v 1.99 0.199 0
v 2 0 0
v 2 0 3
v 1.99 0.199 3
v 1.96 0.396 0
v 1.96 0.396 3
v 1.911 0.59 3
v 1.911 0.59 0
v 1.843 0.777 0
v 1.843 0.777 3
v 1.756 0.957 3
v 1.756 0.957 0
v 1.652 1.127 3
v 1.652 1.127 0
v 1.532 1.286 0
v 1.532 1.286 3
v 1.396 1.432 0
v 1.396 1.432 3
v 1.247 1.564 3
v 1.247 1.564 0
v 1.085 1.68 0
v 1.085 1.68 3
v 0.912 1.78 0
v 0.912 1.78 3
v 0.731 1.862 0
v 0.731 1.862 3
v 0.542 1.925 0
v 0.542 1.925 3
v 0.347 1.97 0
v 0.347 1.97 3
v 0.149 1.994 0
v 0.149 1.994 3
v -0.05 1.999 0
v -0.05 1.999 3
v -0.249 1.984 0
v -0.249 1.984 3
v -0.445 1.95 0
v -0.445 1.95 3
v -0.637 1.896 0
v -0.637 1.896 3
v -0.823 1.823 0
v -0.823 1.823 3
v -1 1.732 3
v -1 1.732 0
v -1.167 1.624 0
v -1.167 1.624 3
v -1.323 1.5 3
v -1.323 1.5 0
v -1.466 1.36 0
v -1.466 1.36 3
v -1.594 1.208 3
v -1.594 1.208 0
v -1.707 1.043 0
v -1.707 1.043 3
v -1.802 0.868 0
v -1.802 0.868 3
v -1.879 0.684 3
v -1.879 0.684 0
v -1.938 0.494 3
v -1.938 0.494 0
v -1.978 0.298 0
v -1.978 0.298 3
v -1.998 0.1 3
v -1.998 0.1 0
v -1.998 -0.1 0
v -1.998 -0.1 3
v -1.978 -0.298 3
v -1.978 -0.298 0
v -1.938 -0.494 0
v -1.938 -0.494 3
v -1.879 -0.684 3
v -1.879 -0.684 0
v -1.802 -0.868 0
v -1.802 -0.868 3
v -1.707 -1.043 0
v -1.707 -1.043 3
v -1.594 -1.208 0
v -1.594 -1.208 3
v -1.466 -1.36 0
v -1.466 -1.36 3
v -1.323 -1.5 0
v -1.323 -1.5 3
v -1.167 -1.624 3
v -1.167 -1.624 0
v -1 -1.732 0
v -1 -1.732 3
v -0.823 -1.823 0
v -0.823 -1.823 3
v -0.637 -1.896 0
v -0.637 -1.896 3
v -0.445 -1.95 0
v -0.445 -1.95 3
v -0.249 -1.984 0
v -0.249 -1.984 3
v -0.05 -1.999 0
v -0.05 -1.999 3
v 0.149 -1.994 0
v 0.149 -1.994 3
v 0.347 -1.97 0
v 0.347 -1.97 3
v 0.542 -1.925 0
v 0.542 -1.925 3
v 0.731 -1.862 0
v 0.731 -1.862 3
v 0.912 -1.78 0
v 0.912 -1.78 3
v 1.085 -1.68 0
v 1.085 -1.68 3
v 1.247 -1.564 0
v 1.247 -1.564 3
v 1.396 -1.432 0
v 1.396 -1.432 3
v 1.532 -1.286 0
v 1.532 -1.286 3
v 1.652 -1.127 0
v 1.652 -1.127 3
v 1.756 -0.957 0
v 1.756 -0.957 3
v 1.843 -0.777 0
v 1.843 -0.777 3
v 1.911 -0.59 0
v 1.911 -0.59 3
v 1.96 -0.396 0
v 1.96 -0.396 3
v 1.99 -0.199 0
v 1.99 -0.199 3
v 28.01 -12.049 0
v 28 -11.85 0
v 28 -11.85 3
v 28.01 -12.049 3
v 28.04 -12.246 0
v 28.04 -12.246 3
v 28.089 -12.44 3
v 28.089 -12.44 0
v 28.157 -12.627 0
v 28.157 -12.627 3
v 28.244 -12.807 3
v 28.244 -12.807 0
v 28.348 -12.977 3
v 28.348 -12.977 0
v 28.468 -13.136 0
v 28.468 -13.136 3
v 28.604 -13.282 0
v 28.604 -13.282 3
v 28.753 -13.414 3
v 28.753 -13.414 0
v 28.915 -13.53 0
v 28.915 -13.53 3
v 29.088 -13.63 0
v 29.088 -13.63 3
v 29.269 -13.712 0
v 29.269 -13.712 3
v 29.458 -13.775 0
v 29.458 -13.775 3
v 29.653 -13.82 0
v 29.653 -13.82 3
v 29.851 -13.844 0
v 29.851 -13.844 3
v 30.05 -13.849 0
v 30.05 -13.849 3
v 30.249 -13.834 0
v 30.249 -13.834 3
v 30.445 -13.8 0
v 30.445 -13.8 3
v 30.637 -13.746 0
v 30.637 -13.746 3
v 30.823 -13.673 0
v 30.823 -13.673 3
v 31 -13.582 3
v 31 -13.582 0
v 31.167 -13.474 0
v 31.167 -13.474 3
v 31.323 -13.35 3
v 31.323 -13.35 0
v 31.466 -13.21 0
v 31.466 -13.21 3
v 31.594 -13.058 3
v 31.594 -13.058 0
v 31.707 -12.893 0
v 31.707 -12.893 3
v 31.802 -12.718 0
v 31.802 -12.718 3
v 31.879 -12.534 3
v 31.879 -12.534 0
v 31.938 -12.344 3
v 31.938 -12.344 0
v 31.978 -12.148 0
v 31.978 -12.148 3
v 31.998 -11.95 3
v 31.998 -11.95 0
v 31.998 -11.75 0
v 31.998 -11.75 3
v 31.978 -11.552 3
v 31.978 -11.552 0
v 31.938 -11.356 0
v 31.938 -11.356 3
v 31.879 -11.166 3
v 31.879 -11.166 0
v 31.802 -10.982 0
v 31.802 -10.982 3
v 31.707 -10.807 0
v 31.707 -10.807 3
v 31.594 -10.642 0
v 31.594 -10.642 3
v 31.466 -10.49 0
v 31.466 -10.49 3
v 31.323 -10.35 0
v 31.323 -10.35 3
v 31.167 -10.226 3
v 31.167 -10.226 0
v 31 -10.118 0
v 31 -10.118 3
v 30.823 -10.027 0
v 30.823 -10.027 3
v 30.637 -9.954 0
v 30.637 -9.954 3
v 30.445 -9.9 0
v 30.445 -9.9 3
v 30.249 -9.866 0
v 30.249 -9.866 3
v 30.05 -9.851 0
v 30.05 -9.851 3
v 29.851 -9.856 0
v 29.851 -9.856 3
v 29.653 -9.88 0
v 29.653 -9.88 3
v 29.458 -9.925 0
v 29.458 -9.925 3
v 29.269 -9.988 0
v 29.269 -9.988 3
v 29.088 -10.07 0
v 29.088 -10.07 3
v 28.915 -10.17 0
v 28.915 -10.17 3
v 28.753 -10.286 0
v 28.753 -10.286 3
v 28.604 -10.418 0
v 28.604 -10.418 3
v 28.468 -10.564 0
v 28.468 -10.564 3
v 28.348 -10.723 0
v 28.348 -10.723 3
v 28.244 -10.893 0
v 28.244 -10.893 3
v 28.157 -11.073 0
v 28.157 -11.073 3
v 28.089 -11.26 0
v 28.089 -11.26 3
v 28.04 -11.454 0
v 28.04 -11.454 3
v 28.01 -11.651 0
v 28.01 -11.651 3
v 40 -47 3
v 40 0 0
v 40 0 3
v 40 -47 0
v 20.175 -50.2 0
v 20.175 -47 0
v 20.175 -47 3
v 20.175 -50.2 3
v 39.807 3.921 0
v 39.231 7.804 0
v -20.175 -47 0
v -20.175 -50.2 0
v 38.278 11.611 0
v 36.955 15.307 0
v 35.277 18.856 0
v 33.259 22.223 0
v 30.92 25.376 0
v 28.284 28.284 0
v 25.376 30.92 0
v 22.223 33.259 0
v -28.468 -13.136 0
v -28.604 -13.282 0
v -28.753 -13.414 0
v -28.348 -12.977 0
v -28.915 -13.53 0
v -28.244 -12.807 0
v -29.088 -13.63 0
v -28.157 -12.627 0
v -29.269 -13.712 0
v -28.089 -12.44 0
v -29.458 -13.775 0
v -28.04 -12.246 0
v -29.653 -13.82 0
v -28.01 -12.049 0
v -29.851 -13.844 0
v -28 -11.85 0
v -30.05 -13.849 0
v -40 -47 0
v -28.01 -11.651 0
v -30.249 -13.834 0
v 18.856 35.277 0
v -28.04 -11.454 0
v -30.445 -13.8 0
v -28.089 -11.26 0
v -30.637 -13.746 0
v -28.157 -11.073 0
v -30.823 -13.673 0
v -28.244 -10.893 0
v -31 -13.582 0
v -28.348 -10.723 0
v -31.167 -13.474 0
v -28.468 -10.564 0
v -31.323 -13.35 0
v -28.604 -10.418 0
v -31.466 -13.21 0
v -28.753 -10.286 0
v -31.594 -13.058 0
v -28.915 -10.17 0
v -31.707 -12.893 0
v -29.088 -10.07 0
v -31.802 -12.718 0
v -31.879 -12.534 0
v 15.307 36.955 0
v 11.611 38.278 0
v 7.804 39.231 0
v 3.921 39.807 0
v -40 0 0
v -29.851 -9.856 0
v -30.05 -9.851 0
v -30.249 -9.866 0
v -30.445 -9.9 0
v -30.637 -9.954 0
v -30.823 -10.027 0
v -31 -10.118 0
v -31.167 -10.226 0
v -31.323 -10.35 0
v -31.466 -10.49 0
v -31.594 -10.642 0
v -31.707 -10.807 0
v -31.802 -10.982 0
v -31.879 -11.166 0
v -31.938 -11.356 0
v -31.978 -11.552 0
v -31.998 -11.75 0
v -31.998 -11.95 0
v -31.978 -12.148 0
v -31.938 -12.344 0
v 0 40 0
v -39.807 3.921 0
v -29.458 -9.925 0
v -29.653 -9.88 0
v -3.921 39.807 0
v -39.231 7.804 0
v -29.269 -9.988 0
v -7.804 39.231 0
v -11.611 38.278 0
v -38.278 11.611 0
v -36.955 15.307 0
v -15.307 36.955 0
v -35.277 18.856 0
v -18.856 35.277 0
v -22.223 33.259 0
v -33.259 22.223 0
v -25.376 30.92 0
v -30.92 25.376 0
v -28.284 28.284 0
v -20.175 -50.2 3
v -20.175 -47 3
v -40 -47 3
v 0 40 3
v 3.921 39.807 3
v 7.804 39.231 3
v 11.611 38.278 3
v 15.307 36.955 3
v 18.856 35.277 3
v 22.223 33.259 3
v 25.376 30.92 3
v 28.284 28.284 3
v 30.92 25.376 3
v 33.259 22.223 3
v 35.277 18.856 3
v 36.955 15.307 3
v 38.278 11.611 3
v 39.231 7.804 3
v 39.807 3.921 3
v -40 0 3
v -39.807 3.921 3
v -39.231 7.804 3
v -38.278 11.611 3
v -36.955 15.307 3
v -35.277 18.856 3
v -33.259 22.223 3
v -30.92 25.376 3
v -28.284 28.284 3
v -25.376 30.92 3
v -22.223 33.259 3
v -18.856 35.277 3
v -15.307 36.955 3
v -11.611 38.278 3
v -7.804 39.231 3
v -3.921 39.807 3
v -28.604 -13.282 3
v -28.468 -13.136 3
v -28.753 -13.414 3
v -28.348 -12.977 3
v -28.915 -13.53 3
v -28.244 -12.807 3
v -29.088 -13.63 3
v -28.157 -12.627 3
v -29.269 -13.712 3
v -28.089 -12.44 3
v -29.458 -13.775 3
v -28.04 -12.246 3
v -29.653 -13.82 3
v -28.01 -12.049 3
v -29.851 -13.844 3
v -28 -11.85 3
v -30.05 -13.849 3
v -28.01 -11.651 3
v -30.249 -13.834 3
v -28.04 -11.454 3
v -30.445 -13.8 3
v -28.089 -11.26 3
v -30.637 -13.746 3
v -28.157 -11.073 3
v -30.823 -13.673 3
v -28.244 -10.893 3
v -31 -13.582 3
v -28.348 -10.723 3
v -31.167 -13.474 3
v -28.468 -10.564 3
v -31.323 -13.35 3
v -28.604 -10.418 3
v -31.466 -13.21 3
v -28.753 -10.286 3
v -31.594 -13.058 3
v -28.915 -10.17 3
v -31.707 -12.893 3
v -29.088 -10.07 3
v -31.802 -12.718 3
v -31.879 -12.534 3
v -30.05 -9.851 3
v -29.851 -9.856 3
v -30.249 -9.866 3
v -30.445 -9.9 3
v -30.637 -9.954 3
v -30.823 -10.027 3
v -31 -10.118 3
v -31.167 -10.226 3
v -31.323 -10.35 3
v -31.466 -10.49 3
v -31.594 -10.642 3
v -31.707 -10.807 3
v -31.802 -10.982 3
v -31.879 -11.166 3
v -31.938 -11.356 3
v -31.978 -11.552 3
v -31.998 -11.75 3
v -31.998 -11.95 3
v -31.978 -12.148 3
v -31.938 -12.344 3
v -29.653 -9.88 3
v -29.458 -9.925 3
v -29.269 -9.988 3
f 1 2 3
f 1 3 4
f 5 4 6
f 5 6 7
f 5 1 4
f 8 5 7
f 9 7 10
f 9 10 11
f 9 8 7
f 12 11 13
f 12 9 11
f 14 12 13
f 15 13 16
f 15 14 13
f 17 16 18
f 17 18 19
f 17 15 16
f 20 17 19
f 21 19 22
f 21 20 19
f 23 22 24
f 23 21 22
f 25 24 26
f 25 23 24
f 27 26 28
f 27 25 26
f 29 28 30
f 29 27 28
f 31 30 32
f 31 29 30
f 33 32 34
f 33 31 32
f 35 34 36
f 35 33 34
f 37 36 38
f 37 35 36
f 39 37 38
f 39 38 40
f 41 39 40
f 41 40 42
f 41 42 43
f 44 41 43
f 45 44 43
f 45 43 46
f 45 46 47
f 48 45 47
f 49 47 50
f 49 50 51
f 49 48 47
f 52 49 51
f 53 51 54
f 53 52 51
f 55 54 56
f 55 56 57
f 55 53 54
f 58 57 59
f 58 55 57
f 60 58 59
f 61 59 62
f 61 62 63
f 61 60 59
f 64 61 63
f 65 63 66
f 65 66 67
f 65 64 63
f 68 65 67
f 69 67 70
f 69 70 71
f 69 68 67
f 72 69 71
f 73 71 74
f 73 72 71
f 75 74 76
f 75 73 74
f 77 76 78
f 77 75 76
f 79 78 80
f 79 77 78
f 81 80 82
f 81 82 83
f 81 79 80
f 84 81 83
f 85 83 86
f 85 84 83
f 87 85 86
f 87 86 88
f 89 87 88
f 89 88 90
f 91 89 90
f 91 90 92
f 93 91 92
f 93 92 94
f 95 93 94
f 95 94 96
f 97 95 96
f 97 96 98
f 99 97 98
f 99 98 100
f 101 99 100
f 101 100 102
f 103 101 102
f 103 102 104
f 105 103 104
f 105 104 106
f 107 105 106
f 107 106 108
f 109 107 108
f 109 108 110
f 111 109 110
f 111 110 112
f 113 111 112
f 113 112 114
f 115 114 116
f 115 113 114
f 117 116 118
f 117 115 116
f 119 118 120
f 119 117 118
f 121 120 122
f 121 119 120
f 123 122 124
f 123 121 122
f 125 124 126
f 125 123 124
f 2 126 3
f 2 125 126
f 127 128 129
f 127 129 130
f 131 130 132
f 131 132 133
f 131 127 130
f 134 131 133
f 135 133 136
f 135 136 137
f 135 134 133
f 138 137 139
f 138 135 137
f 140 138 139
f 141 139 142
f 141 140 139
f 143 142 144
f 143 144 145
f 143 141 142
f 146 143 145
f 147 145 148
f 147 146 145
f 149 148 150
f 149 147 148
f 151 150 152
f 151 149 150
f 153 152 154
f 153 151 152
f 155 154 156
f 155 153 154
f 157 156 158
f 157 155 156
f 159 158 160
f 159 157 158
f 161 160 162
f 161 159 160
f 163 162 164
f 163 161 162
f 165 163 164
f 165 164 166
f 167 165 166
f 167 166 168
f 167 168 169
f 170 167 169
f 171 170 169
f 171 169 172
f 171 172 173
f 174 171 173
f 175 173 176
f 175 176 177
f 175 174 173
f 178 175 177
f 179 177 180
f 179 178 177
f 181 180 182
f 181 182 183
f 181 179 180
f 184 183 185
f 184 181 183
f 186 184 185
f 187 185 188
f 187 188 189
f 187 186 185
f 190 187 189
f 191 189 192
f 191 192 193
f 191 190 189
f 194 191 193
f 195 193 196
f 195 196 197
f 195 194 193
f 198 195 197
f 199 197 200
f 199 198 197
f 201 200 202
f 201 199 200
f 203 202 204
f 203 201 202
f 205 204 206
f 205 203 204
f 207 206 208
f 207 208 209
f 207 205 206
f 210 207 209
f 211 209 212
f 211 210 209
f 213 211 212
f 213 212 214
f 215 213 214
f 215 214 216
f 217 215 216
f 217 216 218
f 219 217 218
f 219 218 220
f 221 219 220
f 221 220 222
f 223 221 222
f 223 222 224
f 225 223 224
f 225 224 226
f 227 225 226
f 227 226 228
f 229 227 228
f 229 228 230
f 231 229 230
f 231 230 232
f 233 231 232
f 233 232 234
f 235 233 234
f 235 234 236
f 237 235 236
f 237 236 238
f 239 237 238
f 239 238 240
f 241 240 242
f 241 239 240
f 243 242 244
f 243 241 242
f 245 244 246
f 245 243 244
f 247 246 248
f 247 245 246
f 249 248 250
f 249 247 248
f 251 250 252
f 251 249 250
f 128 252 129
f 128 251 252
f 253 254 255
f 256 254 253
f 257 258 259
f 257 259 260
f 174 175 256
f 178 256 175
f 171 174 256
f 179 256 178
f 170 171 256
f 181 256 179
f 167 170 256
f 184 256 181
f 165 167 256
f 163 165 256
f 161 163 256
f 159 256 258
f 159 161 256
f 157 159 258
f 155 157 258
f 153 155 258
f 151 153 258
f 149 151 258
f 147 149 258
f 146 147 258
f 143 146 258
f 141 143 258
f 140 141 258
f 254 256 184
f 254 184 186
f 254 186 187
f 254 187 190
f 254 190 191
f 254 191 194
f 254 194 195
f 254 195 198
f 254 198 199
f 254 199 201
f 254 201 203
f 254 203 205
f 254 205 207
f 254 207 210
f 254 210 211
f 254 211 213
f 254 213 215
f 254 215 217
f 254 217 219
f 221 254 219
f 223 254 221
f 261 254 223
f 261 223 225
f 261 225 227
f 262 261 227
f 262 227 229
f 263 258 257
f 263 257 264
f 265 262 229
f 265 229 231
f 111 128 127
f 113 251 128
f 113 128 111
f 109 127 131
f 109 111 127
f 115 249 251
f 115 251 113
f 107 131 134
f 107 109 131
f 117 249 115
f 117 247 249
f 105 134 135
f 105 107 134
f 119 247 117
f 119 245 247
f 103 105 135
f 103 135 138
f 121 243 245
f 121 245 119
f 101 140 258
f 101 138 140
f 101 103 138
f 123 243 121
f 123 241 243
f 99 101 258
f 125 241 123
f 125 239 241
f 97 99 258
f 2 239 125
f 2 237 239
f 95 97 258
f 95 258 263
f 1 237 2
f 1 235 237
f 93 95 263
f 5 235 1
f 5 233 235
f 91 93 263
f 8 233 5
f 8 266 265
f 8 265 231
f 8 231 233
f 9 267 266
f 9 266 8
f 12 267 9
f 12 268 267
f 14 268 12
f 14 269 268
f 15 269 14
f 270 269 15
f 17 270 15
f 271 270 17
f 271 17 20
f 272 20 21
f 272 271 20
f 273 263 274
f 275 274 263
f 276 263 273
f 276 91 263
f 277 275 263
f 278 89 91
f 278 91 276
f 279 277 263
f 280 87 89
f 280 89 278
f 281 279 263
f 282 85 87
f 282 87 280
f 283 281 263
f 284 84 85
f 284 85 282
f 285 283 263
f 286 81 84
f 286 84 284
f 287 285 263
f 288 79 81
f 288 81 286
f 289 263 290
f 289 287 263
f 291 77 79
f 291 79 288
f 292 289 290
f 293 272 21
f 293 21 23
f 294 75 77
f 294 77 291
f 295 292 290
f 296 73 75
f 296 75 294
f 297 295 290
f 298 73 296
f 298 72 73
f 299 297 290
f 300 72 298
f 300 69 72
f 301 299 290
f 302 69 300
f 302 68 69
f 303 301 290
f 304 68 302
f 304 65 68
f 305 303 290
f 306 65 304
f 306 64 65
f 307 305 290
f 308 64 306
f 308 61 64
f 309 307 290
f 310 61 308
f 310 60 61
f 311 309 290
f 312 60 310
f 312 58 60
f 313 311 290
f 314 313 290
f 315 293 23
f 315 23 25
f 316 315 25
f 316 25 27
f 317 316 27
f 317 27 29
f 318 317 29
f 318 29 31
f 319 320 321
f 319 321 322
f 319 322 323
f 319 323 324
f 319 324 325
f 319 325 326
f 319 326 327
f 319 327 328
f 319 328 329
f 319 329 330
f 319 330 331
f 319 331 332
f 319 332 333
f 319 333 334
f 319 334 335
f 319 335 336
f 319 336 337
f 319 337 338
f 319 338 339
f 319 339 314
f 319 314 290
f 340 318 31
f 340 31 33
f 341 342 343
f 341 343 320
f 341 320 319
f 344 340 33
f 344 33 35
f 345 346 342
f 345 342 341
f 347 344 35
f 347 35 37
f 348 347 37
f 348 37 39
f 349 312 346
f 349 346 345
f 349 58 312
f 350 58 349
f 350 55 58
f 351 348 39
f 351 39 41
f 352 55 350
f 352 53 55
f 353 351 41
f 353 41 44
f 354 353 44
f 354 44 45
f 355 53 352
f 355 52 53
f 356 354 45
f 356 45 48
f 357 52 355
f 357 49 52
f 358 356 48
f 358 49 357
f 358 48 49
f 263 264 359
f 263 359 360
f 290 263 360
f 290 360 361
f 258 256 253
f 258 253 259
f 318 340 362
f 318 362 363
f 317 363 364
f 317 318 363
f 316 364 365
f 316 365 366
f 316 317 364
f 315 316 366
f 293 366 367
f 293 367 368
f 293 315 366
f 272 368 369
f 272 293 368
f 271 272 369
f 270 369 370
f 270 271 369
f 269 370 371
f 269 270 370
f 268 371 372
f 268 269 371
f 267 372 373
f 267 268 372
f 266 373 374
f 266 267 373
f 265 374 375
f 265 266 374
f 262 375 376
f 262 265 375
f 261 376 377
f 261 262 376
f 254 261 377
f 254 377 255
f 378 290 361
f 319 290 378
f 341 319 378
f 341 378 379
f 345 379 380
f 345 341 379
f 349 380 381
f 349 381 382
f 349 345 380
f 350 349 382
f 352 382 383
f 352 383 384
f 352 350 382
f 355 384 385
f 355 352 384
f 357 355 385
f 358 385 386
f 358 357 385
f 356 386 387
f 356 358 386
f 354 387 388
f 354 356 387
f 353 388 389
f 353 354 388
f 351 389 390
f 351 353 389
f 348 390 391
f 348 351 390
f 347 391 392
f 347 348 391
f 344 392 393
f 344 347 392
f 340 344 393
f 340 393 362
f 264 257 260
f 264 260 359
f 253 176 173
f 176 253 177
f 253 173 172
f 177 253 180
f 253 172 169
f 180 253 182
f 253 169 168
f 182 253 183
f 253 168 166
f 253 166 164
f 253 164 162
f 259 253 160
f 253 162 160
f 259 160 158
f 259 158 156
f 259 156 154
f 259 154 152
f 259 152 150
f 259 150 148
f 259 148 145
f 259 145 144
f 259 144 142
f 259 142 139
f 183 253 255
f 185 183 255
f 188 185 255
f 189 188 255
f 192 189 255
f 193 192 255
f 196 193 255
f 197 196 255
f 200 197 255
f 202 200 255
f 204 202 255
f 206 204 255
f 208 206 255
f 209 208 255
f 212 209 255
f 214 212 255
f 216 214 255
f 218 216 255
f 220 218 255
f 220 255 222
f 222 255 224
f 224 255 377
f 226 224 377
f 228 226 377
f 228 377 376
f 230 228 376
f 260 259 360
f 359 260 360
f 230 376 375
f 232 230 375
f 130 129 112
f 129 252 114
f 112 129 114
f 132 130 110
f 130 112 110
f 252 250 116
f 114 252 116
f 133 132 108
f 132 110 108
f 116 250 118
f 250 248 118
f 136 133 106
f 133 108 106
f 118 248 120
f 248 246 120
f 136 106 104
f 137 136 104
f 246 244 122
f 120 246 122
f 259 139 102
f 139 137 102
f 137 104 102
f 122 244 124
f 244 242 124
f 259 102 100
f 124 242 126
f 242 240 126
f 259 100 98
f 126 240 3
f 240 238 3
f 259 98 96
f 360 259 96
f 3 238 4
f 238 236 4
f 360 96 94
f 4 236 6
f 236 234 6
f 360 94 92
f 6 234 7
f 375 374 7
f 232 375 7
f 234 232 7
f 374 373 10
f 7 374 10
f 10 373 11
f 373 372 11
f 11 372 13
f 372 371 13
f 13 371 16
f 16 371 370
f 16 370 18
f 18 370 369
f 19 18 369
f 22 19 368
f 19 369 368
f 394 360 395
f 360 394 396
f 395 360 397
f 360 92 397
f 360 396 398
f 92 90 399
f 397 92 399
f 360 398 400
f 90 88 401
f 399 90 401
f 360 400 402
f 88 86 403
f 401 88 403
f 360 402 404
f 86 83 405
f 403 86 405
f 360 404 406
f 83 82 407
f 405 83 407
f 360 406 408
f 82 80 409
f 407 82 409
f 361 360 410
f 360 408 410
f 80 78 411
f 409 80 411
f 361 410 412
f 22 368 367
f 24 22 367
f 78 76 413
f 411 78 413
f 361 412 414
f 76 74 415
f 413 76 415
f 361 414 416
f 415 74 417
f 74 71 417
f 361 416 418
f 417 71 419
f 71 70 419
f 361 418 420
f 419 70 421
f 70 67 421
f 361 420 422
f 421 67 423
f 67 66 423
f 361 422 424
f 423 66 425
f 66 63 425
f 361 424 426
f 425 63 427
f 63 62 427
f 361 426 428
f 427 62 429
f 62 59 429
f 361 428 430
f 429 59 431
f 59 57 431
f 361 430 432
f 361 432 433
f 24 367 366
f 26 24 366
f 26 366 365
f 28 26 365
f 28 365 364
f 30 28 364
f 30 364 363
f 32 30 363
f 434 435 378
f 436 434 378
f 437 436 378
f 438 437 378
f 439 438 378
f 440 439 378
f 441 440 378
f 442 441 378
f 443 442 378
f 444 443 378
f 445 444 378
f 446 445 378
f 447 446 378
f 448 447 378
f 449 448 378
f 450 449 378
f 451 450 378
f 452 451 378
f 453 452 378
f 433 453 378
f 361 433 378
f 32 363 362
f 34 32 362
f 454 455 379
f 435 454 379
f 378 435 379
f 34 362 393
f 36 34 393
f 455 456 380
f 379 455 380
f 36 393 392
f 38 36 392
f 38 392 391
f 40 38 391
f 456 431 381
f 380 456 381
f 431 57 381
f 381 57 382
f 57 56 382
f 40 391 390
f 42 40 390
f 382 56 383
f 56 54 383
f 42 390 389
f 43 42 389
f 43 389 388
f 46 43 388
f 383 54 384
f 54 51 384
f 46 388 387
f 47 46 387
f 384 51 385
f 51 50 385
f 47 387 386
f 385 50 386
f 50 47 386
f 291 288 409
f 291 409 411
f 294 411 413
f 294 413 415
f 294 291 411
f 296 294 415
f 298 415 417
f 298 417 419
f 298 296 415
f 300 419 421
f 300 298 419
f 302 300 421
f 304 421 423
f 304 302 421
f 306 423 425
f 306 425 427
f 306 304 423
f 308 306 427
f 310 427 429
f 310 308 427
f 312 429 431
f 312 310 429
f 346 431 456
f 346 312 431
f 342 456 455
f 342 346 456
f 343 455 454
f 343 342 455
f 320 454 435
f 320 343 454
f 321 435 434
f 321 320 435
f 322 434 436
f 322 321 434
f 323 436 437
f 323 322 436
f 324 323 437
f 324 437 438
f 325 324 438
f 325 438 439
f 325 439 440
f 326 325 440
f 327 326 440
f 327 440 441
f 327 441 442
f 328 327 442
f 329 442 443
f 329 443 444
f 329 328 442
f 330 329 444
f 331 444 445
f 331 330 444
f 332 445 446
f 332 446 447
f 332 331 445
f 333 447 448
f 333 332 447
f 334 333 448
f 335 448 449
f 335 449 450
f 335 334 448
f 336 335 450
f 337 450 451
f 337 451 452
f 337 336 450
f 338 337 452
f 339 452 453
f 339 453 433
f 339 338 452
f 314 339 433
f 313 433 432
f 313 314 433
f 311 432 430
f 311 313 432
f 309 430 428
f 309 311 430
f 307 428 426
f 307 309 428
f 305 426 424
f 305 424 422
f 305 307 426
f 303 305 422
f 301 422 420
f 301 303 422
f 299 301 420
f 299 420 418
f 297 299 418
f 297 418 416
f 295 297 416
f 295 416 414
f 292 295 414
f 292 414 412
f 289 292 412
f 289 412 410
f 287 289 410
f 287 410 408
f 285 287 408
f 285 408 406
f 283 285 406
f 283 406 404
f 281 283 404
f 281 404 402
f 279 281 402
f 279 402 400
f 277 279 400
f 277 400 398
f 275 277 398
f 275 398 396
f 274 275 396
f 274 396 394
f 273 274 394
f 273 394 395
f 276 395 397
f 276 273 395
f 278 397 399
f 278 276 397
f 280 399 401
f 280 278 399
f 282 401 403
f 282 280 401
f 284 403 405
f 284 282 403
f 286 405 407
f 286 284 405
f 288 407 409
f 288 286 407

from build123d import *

# Parameters (mm, degrees)
CROQUIS1_R              = 2
SALIENTE_EXTRUIR1_DEPTH = 3


with BuildPart() as part:
    # Croquis1 → Saliente-Extruir1 (new body)
    with BuildSketch(Plane.XY):
        with BuildLine():
            Line((40, 0), (40, -47))
            Line((40, -47), (20.175, -47))
            Line((20.175, -47), (20.175, -50.2))
            Line((20.175, -50.2), (-20.175, -50.2))
            Line((-20.175, -50.2), (-20.175, -47))
            Line((-20.175, -47), (-40, -47))
            Line((-40, -47), (-40, 0))
            ThreePointArc((-40, 0), (-28.284271247, 28.284271247), (0, 40))
            ThreePointArc((0, 40), (28.284271247, 28.284271247), (40, 0))
        make_face()
        with Locations((-30, -11.85)):
            Circle(CROQUIS1_R, mode=Mode.SUBTRACT)
        with Locations(Location((30, -11.85, 0), (0, 0, 180))):
            Circle(CROQUIS1_R, mode=Mode.SUBTRACT)
        Circle(CROQUIS1_R, mode=Mode.SUBTRACT)
    extrude(amount=SALIENTE_EXTRUIR1_DEPTH)


solid = part.part
